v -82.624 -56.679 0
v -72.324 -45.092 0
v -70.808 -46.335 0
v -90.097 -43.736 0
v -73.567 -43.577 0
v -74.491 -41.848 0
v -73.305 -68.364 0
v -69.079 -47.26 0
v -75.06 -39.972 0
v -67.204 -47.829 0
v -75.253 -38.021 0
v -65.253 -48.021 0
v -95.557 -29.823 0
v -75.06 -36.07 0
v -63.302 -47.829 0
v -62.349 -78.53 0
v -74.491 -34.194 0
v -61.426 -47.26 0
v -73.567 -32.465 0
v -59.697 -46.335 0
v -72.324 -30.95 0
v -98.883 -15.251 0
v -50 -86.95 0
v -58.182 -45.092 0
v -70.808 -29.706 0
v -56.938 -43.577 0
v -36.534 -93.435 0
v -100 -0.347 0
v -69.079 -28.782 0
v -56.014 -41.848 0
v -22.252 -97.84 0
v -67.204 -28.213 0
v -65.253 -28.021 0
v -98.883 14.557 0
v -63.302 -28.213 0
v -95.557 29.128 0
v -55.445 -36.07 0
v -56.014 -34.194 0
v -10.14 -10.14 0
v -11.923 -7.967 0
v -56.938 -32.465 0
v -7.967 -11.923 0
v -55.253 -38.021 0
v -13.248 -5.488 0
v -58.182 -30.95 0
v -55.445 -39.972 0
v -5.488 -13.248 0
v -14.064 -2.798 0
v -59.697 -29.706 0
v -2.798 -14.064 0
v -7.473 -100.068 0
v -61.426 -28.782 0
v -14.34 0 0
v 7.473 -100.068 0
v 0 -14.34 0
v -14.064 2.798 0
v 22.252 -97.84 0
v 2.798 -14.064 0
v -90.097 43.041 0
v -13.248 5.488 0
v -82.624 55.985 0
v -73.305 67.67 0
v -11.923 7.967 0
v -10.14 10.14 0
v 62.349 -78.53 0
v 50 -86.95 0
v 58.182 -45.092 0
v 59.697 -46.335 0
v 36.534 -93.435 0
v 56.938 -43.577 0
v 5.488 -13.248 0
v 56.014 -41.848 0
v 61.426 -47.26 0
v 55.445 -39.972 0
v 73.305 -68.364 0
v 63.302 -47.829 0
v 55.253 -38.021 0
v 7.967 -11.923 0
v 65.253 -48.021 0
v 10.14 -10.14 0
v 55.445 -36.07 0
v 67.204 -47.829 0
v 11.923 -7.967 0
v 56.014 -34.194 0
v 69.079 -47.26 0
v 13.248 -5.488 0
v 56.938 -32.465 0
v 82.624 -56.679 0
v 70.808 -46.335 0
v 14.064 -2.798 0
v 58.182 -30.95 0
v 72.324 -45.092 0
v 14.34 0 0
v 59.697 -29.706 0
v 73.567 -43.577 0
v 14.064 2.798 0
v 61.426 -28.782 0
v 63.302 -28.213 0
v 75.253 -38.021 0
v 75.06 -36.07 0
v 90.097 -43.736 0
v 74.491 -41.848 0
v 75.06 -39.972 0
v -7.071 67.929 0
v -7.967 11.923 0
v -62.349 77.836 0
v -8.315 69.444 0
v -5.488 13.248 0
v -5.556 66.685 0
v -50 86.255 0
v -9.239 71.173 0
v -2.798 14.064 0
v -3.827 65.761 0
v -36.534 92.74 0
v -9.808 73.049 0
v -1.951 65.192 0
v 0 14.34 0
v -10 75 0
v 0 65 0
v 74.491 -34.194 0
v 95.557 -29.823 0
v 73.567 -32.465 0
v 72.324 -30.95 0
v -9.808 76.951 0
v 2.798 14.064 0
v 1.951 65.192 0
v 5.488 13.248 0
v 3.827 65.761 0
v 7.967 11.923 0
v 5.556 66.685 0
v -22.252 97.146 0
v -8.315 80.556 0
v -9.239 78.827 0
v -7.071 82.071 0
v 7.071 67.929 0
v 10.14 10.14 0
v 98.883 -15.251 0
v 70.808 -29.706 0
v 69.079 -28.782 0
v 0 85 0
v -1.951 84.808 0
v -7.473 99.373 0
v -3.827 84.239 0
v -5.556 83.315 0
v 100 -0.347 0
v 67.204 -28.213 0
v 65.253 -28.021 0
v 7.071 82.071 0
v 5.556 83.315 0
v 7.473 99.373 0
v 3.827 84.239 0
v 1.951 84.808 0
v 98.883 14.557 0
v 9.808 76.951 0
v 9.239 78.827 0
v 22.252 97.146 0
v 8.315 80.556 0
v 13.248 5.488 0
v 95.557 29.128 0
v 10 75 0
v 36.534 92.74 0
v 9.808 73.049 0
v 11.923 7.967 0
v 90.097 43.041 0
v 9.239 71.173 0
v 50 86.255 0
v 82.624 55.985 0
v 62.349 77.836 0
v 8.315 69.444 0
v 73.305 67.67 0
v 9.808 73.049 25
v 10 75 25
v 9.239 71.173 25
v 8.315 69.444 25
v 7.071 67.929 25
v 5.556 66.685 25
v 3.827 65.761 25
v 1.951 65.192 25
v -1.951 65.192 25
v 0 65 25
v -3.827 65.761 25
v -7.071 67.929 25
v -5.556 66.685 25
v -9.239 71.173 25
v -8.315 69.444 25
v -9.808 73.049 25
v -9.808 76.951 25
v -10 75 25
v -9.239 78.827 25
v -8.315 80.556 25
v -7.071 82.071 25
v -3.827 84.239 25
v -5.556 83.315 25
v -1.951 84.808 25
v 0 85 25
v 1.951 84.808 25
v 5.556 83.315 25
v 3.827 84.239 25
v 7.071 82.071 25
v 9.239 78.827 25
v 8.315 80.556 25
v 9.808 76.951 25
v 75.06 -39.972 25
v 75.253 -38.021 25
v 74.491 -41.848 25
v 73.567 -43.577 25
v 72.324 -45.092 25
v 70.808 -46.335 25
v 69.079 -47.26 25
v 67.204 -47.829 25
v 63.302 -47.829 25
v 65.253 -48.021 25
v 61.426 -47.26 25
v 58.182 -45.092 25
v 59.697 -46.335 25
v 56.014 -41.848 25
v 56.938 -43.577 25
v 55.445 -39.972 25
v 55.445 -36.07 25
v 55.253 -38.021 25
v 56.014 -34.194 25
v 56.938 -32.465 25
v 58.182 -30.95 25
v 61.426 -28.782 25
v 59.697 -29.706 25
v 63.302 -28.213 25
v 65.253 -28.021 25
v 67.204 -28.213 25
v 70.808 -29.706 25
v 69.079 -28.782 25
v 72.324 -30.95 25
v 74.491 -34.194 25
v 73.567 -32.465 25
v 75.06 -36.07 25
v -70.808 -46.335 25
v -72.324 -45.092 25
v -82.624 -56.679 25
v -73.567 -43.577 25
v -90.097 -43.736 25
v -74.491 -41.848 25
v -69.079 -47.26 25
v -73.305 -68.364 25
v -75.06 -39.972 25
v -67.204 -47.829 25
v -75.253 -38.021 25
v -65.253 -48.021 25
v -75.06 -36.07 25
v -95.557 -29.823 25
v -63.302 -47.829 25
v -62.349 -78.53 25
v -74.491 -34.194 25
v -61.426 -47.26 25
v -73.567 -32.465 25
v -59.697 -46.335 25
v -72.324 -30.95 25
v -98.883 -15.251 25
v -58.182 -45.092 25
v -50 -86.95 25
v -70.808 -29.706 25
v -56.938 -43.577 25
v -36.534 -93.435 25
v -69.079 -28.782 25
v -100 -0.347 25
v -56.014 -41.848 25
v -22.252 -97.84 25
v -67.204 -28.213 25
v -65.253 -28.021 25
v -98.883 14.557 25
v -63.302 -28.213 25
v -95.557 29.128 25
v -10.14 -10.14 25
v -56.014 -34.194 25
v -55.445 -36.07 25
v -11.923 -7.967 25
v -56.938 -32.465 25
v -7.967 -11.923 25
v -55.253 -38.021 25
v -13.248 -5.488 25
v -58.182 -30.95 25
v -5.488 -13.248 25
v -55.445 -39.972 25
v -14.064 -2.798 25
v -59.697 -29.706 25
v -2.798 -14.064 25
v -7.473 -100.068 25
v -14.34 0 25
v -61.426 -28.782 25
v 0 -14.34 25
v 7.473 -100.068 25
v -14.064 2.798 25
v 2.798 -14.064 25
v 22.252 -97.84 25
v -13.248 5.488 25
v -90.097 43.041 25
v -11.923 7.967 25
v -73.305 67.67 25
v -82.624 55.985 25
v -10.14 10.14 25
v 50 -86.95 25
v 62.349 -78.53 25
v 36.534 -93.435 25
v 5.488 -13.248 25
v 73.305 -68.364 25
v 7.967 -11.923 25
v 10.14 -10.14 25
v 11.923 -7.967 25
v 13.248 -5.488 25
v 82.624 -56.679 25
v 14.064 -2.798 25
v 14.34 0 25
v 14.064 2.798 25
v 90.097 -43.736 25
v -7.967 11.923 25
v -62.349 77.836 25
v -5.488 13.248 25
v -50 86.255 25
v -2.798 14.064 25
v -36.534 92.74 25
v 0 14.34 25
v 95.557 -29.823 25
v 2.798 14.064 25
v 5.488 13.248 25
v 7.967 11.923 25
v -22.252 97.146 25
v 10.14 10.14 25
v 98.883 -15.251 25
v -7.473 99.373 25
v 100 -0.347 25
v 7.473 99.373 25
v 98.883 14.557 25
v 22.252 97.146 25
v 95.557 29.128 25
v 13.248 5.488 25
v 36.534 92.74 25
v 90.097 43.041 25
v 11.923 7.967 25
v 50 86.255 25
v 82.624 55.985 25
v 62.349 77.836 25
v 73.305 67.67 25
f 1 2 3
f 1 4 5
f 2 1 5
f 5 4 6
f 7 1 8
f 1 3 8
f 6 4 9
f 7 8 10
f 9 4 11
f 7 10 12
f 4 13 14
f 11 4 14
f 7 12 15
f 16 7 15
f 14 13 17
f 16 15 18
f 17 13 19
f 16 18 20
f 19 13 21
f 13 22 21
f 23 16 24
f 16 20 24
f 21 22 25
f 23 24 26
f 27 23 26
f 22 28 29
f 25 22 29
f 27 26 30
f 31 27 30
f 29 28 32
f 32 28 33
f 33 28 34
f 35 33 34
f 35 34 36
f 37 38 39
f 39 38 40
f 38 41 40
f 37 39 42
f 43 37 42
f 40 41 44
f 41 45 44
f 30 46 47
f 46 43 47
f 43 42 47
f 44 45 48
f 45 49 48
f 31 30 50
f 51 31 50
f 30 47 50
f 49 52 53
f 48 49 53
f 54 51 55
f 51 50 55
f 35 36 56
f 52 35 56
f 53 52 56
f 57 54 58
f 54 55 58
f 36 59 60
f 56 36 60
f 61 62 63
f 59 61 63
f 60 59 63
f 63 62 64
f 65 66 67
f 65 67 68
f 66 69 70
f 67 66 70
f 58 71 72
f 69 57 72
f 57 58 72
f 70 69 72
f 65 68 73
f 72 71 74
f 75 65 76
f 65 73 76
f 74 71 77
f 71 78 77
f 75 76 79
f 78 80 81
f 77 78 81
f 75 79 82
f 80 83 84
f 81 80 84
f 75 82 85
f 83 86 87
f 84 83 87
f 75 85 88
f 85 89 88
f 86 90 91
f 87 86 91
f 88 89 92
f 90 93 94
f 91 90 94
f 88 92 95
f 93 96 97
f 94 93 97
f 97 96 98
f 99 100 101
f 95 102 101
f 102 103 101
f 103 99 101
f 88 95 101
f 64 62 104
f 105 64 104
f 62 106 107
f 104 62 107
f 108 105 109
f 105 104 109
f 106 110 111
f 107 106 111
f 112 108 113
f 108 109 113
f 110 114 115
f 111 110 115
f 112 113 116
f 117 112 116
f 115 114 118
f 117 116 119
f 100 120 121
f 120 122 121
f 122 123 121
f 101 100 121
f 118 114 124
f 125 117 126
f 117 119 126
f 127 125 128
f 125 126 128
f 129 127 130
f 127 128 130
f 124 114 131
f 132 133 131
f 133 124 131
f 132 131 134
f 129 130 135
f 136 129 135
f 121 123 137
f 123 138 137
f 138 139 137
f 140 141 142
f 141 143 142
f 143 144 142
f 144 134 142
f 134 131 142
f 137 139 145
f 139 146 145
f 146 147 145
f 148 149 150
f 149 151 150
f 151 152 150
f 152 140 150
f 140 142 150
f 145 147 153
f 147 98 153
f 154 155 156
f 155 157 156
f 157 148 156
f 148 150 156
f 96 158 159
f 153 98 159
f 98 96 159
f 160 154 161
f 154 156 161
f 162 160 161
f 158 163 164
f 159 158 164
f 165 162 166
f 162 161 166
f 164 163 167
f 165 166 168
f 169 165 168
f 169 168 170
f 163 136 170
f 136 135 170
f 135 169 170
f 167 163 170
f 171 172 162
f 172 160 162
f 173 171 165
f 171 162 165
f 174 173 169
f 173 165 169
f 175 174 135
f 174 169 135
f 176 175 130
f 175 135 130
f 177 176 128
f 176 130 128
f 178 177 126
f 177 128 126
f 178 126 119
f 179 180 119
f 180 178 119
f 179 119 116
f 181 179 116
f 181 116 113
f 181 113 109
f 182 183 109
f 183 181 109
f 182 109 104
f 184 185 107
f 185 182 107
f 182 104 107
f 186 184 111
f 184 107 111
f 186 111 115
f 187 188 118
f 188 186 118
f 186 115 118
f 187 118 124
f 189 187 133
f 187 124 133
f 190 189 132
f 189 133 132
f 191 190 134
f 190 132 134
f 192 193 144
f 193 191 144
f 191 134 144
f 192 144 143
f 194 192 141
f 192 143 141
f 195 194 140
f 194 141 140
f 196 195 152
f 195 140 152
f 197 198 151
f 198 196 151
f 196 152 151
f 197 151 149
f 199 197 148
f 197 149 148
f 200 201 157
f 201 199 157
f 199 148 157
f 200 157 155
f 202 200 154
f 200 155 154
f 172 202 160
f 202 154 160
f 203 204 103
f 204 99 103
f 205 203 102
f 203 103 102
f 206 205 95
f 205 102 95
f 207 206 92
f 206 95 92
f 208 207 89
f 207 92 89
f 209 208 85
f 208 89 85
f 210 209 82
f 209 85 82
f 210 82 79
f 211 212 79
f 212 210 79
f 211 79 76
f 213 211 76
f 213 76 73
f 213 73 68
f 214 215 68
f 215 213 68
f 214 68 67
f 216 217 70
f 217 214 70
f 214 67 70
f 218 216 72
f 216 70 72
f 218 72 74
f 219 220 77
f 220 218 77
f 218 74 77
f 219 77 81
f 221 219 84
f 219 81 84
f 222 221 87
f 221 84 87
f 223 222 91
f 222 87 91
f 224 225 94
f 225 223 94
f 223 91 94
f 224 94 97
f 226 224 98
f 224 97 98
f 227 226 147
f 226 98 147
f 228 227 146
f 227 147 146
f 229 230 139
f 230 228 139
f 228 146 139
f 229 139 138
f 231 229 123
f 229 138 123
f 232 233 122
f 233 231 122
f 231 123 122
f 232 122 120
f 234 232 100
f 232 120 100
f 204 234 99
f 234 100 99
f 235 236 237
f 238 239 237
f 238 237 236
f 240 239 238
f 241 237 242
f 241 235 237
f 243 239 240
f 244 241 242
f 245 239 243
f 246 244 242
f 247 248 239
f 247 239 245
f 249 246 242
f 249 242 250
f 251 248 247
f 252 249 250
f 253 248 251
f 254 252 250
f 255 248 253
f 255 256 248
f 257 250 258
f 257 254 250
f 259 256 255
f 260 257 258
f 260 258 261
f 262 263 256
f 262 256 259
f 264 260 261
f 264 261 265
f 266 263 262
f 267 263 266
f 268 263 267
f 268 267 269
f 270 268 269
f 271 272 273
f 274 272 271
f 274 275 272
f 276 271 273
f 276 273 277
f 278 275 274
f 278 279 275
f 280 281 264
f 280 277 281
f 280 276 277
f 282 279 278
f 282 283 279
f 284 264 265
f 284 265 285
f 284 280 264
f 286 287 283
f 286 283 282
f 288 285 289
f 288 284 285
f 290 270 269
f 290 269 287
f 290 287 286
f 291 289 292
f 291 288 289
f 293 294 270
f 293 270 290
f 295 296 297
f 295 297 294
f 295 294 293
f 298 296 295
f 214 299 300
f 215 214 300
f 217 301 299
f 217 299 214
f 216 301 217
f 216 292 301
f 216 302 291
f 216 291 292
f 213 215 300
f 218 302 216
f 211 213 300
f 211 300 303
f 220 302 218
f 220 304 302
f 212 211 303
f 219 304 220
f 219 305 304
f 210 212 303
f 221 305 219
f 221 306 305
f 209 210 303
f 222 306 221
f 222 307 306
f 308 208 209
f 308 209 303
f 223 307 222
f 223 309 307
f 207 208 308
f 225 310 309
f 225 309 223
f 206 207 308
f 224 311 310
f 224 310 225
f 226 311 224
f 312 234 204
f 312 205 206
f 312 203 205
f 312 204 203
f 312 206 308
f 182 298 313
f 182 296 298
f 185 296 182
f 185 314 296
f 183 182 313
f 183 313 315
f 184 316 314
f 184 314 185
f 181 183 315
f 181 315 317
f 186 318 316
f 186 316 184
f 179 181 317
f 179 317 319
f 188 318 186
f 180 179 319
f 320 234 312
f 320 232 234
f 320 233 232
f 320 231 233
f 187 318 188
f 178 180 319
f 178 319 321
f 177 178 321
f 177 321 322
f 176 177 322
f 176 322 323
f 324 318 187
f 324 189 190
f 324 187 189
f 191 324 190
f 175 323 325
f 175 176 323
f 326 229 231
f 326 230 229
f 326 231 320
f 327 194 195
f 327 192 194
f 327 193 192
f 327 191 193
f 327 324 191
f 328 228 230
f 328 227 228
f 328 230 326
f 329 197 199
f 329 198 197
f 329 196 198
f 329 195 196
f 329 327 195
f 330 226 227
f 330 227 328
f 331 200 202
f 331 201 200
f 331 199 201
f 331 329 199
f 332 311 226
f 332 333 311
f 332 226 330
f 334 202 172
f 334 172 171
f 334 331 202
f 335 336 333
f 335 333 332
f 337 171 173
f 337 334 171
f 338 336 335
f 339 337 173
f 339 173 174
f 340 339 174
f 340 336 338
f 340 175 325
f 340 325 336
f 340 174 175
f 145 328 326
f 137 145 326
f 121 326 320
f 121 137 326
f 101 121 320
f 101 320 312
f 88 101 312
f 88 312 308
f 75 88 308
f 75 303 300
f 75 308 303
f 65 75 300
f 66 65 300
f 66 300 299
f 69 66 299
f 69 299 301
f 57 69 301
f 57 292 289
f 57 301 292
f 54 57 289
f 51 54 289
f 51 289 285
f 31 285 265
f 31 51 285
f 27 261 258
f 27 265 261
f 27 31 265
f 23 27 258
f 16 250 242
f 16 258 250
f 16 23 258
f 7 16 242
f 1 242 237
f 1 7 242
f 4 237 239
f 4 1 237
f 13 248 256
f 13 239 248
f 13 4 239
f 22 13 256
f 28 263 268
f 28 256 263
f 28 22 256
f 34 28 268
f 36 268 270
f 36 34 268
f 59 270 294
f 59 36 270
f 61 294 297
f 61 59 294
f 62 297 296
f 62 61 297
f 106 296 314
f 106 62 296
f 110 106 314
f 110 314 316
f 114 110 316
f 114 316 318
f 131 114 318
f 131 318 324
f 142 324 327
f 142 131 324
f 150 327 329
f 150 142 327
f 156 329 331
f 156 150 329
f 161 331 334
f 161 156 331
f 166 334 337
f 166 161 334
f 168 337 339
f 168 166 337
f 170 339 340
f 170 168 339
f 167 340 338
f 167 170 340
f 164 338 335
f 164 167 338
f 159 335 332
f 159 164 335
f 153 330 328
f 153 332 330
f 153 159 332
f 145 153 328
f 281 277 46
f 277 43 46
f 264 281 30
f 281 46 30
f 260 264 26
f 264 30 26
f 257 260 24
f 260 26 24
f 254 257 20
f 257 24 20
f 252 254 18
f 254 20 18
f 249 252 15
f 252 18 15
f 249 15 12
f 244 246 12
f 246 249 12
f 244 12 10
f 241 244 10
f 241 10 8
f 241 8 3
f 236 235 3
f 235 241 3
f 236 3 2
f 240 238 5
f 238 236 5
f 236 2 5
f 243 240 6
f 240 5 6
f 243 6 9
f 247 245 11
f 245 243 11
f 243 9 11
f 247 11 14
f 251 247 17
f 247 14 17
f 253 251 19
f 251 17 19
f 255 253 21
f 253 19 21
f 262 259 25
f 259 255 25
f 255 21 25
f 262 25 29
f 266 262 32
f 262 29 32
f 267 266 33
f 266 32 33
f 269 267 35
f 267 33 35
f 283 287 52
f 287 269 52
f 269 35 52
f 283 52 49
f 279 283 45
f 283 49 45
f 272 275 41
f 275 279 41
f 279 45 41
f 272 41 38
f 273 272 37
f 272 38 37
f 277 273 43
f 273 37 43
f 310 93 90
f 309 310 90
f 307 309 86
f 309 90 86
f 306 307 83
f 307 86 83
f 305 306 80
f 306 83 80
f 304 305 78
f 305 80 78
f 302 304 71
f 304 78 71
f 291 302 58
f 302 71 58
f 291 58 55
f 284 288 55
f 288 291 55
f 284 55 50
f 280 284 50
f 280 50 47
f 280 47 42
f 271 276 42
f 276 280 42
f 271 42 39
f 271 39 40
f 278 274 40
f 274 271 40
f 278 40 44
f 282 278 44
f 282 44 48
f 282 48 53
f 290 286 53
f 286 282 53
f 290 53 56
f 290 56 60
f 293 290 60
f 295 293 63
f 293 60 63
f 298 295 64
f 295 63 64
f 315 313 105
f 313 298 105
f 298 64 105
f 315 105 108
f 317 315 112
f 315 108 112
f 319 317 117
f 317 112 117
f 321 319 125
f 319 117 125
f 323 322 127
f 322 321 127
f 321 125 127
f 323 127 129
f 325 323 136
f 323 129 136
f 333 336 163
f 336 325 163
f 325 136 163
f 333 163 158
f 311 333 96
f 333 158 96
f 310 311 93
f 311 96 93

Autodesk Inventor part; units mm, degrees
ref_plane "YZ Plane" through (0, 0, 0) normal (1, 0, 0) x (0, 1, 0)
ref_plane "XZ Plane" through (0, 0, 0) normal (0, 1, 0) x (-1, 0, 0)
ref_plane "XY Plane" through (0, 0, 0) normal (0, 0, 1) x (1, 0, 0)
sketch "Esboço1" plane through (0, 0, 0) normal (0, 0, 1) x (1, 0, 0)
  circle A0 centre (0, 0) radius 14.34
  circle A1 centre (0, -0.3472) radius 100
  circle A2 centre (0, 75) radius 10
  circle A3 centre (-65.2526, -38.0208) radius 10
  circle A4 centre (65.2526, -38.0208) radius 10
  dimension "d0" = 200
  dimension "d1" = 20
  dimension "d2" = 75
  dimension "d5" = 360
extrude "Extrusão1" add sketch "Esboço1" along normal blind 25
properties part number "Disco da Valvula Inventor"
